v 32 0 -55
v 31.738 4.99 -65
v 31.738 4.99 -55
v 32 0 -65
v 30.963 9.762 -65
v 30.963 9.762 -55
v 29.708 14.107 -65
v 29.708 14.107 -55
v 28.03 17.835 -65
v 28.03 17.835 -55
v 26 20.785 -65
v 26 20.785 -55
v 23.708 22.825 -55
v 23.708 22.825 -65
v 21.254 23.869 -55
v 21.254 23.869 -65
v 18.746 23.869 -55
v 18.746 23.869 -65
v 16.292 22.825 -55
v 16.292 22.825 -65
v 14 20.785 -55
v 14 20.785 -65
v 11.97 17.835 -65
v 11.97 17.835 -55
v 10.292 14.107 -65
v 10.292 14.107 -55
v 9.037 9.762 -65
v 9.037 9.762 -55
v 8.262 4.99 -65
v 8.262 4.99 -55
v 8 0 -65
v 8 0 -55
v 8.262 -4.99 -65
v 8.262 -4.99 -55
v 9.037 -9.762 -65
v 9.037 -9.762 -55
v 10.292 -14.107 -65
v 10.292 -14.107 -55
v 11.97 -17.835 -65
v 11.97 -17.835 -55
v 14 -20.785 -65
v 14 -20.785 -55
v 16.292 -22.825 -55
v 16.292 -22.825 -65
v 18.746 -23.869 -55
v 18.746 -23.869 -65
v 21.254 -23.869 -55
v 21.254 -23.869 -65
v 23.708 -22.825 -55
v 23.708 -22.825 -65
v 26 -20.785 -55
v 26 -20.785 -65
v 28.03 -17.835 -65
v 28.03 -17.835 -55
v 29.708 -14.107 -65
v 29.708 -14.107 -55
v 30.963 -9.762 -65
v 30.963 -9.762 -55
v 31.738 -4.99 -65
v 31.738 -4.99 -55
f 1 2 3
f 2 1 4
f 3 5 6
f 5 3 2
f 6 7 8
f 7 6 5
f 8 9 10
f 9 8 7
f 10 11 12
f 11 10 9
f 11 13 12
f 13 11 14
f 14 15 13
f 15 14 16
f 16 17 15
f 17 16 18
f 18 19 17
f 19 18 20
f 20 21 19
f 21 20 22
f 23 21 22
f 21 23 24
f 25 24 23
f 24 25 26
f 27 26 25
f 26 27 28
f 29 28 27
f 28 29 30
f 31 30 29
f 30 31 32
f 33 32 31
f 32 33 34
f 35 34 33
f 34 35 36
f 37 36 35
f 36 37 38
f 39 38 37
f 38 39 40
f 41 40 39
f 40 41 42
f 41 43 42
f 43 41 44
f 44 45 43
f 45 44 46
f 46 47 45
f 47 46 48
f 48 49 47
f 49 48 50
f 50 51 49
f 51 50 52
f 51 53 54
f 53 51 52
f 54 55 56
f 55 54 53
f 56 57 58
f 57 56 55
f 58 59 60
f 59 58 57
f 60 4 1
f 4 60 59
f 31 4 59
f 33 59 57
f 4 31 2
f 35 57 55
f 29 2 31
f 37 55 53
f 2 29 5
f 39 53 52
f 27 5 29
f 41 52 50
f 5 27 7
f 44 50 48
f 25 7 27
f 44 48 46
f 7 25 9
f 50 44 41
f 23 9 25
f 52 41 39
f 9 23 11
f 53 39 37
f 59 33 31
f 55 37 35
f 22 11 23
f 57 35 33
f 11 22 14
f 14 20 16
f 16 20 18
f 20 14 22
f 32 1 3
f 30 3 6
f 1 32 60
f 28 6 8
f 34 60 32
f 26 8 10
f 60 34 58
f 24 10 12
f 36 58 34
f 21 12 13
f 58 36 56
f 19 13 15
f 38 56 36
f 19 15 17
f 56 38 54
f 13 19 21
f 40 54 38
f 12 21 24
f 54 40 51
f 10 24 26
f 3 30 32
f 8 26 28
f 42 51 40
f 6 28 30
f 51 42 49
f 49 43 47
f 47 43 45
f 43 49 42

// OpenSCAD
// Generated by generate_scads.py
scale([1.0,2.0,2.0]) {
  translate([20,0,-30]) {
    cylinder(h=5, r=12, center=true);
  }
}
